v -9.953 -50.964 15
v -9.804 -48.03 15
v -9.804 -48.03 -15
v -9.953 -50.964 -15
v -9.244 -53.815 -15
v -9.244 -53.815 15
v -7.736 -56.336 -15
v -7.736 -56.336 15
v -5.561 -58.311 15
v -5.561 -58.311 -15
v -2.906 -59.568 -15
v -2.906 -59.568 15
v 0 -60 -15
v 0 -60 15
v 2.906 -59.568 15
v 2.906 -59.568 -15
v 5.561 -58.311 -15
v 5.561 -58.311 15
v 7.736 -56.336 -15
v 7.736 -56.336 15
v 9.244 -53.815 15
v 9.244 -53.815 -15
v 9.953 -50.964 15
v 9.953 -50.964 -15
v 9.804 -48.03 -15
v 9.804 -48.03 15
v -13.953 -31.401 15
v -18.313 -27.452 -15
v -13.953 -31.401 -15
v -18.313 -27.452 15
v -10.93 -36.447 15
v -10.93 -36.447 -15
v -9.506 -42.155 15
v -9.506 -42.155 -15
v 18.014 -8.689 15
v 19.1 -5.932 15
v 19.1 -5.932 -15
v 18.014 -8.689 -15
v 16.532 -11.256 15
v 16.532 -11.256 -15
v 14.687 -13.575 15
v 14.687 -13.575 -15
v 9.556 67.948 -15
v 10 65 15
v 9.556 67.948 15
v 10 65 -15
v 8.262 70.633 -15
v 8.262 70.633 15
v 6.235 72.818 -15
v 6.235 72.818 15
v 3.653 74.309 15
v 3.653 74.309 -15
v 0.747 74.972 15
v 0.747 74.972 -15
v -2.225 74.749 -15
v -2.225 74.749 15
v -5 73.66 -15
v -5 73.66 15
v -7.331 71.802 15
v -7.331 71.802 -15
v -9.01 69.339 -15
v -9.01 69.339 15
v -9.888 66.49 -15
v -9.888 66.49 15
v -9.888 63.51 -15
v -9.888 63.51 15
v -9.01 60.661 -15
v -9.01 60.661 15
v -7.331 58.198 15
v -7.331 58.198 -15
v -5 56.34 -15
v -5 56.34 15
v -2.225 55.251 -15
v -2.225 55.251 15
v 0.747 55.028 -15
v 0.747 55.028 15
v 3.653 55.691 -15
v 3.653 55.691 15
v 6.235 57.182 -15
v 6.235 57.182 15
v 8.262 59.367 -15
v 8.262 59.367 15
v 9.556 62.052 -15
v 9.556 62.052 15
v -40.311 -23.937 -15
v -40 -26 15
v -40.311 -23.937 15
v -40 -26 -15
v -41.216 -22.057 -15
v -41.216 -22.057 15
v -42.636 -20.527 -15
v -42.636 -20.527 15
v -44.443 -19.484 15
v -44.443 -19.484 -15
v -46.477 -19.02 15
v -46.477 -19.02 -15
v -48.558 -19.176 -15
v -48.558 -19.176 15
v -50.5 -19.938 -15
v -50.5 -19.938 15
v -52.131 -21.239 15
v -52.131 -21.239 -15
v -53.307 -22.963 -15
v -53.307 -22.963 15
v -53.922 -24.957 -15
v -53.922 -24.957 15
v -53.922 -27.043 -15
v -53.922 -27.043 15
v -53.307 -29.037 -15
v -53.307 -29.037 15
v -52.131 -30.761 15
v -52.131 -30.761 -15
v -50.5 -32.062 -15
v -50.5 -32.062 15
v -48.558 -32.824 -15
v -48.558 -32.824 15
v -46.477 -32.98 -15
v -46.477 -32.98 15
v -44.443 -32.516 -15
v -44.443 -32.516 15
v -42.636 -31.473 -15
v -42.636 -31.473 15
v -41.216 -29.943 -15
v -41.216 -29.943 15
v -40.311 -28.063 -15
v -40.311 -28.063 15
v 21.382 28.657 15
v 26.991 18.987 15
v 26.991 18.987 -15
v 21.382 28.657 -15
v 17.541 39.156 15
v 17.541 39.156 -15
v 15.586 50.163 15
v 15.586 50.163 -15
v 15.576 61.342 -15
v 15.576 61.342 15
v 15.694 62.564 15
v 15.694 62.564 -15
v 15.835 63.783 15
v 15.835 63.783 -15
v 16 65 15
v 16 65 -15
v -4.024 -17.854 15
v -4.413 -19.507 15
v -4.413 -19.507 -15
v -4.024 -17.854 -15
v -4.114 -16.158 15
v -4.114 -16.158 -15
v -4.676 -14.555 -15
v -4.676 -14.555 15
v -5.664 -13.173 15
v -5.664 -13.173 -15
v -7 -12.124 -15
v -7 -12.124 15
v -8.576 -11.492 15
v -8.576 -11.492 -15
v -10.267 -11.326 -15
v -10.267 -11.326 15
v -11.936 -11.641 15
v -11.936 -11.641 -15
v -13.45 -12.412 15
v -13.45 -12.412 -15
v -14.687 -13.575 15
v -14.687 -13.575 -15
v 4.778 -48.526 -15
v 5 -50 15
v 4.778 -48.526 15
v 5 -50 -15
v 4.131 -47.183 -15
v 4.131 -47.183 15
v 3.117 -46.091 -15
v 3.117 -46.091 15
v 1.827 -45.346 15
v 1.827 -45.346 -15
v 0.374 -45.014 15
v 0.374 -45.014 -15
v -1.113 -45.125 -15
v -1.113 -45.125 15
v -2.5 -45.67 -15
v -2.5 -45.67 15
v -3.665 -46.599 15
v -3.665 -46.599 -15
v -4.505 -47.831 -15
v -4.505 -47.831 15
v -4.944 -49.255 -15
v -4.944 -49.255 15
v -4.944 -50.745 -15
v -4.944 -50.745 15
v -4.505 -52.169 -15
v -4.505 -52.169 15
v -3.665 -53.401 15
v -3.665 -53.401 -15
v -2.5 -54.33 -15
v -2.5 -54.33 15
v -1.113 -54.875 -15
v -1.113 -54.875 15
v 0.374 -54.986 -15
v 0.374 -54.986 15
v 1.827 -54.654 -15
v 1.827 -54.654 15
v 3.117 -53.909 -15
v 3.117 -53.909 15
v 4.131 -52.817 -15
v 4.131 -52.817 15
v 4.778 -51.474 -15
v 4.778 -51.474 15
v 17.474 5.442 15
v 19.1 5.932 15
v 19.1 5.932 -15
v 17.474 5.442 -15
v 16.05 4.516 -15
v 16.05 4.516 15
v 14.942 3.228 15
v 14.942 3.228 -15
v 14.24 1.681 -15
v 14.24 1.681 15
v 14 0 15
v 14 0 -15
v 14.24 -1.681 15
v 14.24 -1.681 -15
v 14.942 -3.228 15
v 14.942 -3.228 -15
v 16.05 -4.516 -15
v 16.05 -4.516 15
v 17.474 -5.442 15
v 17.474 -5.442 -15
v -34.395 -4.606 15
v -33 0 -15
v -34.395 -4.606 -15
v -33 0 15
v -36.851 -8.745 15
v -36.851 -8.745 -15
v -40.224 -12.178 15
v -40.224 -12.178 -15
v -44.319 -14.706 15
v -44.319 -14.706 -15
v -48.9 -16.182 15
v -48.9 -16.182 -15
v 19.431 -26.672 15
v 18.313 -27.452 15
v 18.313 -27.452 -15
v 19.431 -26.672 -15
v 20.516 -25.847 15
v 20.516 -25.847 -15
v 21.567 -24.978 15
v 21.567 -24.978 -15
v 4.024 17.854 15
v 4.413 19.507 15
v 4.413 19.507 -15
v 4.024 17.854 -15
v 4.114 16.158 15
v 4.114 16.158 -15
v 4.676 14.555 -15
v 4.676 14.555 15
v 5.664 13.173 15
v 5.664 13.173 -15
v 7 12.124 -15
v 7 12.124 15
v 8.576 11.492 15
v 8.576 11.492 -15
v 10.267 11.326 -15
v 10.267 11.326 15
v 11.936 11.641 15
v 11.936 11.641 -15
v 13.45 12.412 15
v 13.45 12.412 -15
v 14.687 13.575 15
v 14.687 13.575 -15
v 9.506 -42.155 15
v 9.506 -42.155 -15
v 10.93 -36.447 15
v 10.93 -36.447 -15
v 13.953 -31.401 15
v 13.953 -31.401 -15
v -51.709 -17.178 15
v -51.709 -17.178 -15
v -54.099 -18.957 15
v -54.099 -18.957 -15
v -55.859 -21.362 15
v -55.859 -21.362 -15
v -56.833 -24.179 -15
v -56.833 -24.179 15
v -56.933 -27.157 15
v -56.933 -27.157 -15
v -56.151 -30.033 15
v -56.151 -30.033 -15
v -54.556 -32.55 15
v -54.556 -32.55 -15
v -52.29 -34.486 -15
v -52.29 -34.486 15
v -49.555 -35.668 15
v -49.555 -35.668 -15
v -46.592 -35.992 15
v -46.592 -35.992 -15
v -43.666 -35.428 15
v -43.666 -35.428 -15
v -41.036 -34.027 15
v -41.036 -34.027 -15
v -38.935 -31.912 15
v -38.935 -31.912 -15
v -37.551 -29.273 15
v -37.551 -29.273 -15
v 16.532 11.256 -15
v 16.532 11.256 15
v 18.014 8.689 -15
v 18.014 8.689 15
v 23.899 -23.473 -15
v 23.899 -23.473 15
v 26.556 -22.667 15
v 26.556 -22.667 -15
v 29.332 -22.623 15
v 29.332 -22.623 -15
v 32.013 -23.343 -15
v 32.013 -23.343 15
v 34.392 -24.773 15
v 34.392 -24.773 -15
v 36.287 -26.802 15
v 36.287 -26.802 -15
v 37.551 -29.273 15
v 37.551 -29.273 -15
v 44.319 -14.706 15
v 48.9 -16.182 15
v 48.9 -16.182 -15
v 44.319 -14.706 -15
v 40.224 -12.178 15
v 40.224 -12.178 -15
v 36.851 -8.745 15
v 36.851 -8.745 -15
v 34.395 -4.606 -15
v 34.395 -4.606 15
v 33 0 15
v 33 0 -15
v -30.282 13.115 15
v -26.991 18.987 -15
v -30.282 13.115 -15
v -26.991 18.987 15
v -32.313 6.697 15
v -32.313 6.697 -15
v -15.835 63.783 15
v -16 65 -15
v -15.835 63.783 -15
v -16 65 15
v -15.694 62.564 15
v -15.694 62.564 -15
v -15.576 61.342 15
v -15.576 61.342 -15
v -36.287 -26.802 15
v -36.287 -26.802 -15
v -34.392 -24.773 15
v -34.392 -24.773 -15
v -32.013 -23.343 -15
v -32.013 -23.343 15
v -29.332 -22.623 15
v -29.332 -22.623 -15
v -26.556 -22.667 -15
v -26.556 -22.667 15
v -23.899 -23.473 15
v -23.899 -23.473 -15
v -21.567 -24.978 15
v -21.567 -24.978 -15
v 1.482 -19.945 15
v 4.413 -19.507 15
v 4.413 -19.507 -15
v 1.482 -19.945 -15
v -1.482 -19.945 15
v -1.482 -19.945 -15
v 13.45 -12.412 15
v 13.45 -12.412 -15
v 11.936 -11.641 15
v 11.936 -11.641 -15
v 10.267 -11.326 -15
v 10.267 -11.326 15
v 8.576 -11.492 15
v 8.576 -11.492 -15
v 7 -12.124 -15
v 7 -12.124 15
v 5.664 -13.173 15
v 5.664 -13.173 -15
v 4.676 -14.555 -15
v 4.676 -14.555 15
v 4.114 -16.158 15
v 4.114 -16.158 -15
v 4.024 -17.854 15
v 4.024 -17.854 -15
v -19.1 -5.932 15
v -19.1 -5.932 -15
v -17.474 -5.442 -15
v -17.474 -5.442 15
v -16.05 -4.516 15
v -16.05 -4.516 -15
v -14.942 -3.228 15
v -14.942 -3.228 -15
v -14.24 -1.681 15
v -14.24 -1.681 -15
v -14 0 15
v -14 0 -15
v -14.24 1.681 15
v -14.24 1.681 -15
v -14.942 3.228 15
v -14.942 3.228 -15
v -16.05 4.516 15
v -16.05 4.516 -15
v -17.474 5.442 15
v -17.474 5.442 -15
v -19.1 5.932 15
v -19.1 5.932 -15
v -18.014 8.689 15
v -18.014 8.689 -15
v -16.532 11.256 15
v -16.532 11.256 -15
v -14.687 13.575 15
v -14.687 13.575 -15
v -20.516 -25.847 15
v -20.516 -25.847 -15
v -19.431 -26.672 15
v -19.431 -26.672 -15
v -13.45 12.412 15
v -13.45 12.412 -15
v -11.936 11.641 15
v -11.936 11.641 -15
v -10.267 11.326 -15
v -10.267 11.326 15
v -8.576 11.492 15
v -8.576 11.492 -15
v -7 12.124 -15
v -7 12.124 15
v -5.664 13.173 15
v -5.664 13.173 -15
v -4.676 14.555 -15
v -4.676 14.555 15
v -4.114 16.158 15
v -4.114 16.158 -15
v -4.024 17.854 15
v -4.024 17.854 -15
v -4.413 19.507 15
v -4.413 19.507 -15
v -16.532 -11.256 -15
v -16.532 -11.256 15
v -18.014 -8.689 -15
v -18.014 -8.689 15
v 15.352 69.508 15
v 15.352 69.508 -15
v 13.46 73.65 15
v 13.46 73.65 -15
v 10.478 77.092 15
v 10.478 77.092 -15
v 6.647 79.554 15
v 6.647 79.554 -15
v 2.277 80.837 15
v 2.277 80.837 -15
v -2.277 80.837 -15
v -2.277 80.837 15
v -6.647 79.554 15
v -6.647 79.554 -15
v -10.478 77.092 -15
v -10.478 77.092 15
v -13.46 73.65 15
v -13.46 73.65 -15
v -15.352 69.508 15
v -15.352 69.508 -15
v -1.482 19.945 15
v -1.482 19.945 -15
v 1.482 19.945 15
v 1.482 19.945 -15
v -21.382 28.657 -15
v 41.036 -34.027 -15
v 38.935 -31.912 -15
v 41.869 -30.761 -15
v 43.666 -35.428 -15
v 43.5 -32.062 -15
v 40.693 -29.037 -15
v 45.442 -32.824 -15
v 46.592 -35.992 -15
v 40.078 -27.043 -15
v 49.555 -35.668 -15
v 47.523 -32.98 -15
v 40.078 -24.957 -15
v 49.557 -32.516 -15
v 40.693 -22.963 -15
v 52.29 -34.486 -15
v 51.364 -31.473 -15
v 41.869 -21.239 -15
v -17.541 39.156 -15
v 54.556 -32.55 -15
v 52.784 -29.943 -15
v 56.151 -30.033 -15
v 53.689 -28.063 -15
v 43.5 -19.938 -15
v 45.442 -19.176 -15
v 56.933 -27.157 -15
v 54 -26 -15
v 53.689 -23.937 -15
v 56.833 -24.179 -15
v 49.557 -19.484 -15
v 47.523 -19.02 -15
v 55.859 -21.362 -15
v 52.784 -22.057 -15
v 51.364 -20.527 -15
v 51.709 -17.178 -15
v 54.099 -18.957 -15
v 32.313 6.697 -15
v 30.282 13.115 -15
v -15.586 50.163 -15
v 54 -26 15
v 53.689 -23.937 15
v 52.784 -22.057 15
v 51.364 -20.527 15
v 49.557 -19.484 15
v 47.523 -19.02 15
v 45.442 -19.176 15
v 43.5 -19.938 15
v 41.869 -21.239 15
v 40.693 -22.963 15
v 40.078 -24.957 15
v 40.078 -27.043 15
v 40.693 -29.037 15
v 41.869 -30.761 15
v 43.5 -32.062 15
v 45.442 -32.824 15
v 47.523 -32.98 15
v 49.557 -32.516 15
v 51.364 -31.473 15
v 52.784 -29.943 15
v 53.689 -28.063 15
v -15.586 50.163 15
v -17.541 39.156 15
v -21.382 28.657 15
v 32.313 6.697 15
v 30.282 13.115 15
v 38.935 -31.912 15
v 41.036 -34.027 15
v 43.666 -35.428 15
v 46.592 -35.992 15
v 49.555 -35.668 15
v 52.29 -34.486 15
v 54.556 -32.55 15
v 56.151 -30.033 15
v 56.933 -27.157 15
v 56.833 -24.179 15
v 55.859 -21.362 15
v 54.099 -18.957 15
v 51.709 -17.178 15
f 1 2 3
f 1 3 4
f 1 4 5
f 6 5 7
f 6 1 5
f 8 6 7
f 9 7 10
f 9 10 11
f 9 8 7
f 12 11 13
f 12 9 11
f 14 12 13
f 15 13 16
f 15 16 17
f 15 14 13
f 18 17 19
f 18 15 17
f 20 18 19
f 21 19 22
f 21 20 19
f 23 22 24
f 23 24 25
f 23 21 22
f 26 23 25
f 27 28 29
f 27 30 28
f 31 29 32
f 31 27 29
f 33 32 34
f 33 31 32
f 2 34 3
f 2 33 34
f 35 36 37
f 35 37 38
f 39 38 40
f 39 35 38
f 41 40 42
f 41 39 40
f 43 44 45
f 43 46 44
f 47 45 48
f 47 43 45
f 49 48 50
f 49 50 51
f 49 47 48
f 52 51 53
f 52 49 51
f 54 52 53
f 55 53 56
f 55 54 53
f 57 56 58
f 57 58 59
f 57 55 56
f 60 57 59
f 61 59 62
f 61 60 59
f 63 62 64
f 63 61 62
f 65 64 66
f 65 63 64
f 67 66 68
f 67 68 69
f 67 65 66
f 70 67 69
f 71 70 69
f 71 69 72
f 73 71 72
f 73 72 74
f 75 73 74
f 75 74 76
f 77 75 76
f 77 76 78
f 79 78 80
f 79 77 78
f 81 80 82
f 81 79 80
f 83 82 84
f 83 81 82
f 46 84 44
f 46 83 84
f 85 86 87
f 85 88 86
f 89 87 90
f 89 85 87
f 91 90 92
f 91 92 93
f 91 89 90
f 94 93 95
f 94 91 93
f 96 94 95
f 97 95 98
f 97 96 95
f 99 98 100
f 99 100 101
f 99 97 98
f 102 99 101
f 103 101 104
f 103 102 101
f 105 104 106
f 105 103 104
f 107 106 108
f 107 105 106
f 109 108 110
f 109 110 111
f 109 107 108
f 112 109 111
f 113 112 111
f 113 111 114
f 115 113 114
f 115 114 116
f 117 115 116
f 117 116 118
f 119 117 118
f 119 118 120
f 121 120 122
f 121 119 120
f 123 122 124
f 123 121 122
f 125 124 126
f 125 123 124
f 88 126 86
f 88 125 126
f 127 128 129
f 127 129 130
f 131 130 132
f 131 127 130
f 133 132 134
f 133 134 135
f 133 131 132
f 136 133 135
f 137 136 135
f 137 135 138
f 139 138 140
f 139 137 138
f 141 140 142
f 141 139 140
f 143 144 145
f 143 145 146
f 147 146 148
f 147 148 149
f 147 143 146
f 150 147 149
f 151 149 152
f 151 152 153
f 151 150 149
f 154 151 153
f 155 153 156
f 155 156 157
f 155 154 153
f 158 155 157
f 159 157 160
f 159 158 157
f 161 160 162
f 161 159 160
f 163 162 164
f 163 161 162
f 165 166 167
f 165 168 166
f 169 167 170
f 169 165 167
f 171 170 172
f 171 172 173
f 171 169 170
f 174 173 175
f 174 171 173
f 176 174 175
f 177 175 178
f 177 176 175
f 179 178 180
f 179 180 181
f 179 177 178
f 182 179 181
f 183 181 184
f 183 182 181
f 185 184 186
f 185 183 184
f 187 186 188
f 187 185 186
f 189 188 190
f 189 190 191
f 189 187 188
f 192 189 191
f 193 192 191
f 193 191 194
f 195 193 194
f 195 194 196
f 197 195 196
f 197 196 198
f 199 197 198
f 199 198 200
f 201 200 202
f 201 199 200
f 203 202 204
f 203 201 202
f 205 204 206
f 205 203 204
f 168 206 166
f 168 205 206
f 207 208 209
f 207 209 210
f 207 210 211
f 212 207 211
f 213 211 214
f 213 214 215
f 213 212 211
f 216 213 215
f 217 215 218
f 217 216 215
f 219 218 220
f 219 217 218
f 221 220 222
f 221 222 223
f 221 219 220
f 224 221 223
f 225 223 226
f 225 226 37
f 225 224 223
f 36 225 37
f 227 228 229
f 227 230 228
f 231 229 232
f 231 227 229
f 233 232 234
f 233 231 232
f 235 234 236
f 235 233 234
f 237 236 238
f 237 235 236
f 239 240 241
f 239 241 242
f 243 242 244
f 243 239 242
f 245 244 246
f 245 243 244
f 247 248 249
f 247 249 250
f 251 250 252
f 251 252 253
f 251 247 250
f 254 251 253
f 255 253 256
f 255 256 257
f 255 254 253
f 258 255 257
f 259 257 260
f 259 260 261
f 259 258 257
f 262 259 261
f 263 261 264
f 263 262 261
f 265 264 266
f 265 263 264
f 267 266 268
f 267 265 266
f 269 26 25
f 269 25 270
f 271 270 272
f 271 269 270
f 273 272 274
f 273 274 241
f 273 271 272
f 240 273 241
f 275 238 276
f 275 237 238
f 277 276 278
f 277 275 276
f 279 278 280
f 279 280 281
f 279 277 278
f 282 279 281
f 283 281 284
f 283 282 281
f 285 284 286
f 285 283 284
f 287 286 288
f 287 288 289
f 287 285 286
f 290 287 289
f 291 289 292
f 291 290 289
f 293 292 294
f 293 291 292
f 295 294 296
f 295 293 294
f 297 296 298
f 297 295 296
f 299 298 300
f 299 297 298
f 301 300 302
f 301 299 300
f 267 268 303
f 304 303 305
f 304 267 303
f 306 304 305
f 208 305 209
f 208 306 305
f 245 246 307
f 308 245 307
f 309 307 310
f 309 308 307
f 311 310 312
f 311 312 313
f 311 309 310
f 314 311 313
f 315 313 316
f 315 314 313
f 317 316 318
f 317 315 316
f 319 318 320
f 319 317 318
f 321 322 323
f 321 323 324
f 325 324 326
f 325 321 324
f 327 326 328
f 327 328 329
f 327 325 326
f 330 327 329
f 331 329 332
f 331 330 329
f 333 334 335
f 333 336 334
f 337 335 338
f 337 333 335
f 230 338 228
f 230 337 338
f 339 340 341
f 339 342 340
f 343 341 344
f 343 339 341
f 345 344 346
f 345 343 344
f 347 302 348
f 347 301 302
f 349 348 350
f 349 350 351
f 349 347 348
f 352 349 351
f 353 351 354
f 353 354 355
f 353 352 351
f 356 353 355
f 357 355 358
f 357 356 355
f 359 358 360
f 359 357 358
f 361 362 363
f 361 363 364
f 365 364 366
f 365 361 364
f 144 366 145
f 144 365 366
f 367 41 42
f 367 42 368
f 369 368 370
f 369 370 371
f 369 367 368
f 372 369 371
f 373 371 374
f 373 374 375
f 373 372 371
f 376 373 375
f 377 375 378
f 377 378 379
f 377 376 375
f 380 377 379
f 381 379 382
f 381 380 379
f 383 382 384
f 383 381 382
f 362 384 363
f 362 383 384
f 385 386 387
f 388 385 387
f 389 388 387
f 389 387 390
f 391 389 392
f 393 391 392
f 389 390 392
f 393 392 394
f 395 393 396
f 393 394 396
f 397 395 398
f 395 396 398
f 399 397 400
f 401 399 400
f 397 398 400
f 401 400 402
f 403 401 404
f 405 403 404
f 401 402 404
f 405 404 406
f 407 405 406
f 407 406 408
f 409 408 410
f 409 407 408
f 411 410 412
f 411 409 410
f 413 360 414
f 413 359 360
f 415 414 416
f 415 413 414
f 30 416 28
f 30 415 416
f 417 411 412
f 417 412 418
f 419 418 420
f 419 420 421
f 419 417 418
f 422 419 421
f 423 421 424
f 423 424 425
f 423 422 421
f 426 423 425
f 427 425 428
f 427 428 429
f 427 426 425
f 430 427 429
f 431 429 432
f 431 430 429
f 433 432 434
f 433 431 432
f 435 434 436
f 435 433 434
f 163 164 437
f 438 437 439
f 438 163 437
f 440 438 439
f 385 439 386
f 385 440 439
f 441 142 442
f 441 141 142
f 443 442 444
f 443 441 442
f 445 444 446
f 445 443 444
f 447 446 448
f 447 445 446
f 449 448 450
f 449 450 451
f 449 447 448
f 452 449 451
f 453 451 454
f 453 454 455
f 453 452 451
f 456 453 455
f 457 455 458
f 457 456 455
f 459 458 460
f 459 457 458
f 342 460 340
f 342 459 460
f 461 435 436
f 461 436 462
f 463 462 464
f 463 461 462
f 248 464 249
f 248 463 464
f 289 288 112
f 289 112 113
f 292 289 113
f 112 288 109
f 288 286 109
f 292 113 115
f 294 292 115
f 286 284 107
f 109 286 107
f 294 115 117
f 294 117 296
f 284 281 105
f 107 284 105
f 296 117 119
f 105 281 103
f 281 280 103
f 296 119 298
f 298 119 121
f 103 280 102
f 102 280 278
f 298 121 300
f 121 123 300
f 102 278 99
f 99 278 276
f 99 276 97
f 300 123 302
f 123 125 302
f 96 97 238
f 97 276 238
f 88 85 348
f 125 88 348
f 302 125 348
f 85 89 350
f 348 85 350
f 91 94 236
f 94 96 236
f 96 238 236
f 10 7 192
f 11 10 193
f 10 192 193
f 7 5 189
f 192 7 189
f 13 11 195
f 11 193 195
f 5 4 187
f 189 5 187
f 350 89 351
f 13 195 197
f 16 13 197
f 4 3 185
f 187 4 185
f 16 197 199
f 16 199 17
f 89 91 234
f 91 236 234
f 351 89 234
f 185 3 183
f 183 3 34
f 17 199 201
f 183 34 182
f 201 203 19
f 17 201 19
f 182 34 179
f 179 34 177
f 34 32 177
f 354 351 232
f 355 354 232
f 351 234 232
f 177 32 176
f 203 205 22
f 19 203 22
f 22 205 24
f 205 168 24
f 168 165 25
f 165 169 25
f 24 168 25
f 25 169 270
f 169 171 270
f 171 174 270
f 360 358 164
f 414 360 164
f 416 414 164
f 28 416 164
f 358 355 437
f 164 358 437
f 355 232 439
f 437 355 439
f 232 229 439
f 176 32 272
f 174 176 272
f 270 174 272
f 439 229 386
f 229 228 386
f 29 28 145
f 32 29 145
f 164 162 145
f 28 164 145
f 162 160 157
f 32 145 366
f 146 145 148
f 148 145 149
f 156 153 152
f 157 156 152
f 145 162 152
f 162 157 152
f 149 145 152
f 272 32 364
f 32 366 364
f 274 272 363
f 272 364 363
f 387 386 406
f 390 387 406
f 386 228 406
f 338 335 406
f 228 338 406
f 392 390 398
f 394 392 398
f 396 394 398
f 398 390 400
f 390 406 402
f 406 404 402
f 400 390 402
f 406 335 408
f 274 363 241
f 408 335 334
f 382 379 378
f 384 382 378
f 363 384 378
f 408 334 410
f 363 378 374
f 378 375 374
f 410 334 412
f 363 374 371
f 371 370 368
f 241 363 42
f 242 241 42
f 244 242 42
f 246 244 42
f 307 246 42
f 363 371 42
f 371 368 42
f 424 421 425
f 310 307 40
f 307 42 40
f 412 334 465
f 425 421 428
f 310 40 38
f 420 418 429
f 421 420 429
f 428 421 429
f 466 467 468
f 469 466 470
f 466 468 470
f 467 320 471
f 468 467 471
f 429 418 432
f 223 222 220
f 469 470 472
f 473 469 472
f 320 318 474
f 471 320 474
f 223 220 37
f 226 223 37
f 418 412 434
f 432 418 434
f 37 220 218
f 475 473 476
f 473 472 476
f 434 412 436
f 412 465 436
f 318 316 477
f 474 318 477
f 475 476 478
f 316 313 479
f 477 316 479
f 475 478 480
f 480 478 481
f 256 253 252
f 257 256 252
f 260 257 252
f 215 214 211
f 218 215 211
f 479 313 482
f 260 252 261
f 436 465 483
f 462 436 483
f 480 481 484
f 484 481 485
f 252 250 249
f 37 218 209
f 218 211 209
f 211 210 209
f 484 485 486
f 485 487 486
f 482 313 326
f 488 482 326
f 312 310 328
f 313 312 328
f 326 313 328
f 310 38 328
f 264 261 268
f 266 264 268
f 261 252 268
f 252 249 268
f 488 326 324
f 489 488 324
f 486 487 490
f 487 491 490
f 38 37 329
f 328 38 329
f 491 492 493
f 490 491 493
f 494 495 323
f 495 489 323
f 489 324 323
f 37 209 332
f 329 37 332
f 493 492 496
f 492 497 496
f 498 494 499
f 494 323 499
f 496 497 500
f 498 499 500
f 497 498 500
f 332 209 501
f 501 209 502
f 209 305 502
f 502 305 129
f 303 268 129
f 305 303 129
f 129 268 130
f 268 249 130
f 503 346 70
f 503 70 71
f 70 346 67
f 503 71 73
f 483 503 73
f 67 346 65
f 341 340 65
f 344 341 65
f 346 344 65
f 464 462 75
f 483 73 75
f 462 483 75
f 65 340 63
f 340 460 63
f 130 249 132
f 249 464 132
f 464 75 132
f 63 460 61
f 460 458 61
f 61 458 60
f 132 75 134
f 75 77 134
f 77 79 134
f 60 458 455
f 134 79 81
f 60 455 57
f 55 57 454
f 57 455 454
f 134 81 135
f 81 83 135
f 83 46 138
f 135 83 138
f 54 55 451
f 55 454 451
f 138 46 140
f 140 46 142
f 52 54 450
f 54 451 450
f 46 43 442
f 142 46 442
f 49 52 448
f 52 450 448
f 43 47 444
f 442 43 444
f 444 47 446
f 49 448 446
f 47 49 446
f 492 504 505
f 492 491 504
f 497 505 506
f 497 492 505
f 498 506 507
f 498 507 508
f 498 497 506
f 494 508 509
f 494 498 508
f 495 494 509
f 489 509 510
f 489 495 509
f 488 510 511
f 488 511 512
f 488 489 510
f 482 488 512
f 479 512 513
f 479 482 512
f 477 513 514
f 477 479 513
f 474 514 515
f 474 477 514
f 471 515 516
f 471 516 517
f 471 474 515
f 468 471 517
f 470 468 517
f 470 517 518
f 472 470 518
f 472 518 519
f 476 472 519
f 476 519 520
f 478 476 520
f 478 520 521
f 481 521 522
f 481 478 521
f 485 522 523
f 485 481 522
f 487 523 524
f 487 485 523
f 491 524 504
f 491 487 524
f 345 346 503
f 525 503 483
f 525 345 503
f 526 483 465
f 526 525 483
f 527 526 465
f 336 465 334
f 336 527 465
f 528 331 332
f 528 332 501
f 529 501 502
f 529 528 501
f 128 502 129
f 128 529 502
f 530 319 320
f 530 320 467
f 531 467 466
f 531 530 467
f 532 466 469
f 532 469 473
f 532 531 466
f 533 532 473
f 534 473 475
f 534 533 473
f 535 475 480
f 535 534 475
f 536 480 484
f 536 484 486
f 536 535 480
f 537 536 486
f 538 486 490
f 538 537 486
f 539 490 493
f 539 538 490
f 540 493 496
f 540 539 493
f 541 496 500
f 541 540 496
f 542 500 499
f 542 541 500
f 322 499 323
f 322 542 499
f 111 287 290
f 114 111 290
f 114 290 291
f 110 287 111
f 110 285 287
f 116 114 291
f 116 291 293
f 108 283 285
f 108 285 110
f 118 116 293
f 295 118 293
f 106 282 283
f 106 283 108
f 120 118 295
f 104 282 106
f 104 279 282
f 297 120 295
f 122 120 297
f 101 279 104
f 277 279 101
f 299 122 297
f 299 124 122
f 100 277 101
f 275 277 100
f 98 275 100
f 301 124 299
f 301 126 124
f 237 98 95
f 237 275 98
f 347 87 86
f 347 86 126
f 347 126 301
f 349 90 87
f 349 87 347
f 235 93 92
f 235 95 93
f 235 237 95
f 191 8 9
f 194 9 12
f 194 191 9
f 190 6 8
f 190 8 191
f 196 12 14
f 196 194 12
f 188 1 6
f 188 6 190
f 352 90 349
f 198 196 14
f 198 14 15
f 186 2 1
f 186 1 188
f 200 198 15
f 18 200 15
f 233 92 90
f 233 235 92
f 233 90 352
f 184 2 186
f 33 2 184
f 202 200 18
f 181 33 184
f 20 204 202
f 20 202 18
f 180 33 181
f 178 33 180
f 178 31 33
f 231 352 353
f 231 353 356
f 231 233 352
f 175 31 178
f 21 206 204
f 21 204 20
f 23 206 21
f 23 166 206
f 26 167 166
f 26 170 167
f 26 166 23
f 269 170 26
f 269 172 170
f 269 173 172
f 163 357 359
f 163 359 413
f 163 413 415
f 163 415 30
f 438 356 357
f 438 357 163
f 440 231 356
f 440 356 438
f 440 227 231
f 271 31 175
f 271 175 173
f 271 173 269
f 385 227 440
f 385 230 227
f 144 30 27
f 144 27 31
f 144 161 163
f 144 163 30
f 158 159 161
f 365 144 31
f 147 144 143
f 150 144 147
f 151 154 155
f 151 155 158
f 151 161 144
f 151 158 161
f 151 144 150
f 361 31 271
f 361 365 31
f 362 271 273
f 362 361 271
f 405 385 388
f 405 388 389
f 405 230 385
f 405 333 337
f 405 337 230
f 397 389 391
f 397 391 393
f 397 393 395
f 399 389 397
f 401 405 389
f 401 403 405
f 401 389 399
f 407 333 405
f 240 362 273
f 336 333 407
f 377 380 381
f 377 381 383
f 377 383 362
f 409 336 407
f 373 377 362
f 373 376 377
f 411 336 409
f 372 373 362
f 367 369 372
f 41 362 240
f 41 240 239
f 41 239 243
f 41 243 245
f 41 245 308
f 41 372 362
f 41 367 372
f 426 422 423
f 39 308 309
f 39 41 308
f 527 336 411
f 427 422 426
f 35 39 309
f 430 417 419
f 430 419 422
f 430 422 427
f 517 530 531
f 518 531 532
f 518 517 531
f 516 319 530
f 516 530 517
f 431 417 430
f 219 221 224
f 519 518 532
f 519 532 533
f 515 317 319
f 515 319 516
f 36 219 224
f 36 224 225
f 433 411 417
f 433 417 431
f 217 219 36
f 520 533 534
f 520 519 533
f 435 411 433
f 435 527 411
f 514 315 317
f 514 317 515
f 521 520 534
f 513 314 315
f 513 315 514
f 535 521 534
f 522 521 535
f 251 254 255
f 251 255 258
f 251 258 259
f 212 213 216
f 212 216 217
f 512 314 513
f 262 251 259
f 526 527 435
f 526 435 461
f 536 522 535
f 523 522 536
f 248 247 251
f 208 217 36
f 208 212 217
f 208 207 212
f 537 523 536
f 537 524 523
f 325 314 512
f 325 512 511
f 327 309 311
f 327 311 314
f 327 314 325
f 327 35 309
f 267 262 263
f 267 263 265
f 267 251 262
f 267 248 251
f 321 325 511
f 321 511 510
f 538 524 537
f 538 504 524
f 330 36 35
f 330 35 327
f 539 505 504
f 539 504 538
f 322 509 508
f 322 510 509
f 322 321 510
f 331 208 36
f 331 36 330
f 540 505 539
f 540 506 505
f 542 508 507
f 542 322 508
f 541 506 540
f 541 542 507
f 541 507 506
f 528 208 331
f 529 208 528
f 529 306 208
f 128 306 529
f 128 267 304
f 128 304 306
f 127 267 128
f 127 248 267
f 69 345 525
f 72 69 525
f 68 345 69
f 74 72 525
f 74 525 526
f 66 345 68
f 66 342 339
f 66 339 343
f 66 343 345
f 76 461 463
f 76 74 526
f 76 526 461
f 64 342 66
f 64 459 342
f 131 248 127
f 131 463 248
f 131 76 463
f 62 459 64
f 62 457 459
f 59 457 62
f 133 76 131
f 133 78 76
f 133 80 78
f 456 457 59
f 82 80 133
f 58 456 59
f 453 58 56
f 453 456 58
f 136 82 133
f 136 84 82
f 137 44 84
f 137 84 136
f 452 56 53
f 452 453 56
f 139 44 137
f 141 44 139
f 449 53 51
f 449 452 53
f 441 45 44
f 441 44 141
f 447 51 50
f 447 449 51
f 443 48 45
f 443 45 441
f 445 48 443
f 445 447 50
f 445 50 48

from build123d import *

# Parameters (mm, degrees)
SKETCH1_R           = 7
SKETCH1_R_2         = 5
SKETCH1_R_3         = 10
BOSS_EXTRUDE1_DEPTH = 15


with BuildPart() as part:
    # Sketch1 → Boss-Extrude1 (new, symmetric)
    with BuildSketch(Plane.XY):
        with BuildLine():
            ThreePointArc((-18.313197236, -27.452264151), (-10.929939867, -36.447383635), (-9.804034884, -48.03))
            ThreePointArc((-9.804034884, -48.03), (0, -60), (9.804034884, -48.03))
            ThreePointArc((9.804034884, -48.03), (10.929939867, -36.447383635), (18.313197236, -27.452264151))
            ThreePointArc((18.313197236, -27.452264151), (19.978209416, -26.265398313), (21.566520754, -24.9776937))
            ThreePointArc((21.566520754, -24.9776937), (30.697148757, -22.889346352), (37.550915036, -29.273345896))
            ThreePointArc((37.550915036, -29.273345896), (54.555971575, -32.550365911), (48.899852708, -16.182130593))
            ThreePointArc((48.899852708, -16.182130593), (38.43354311, -10.563553249), (33, 0))
            ThreePointArc((33, 0), (31.461859707, 9.957478785), (26.990825227, 18.986715186))
            ThreePointArc((26.990825227, 18.986715186), (17.541357446, 39.155919937), (15.576262231, 61.342124263))
            ThreePointArc((15.576262231, 61.342124263), (15.761817989, 63.174110312), (16, 65))
            ThreePointArc((16, 65), (0, 81), (-16, 65))
            ThreePointArc((-16, 65), (-15.761817989, 63.174110312), (-15.576262231, 61.342124263))
            ThreePointArc((-15.576262231, 61.342124263), (-17.541357446, 39.155919937), (-26.990825227, 18.986715186))
            ThreePointArc((-26.990825227, 18.986715186), (-31.461859707, 9.957478785), (-33, 0))
            ThreePointArc((-33, 0), (-38.43354311, -10.563553249), (-48.899852708, -16.182130593))
            ThreePointArc((-48.899852708, -16.182130593), (-54.555971575, -32.550365911), (-37.550915036, -29.273345896))
            ThreePointArc((-37.550915036, -29.273345896), (-30.697148757, -22.889346352), (-21.566520754, -24.9776937))
            ThreePointArc((-21.566520754, -24.9776937), (-19.978209416, -26.265398313), (-18.313197236, -27.452264151))
        make_face()
        with Locations((-47, -26)):
            Circle(SKETCH1_R, mode=Mode.SUBTRACT)
        with Locations((0, -50)):
            Circle(SKETCH1_R_2, mode=Mode.SUBTRACT)
        with BuildLine():
            ThreePointArc((19.1, -5.93211598), (17.320508076, -10), (14.687363137, -13.575027222))
            ThreePointArc((14.687363137, -13.575027222), (7, -12.124355653), (4.412636863, -19.507143202))
            ThreePointArc((4.412636863, -19.507143202), (0, -20), (-4.412636863, -19.507143202))
            ThreePointArc((-4.412636863, -19.507143202), (-7, -12.124355653), (-14.687363137, -13.575027222))
            ThreePointArc((-14.687363137, -13.575027222), (-17.320508076, -10), (-19.1, -5.93211598))
            ThreePointArc((-19.1, -5.93211598), (-14, 0), (-19.1, 5.93211598))
            ThreePointArc((-19.1, 5.93211598), (-17.320508076, 10), (-14.687363137, 13.575027222))
            ThreePointArc((-14.687363137, 13.575027222), (-7, 12.124355653), (-4.412636863, 19.507143202))
            ThreePointArc((-4.412636863, 19.507143202), (0, 20), (4.412636863, 19.507143202))
            ThreePointArc((4.412636863, 19.507143202), (7, 12.124355653), (14.687363137, 13.575027222))
            ThreePointArc((14.687363137, 13.575027222), (17.320508076, 10), (19.1, 5.93211598))
            ThreePointArc((19.1, 5.93211598), (14, 0), (19.1, -5.93211598))
        make_face(mode=Mode.SUBTRACT)
        with Locations((47, -26)):
            Circle(SKETCH1_R, mode=Mode.SUBTRACT)
        with Locations((0, 65)):
            Circle(SKETCH1_R_3, mode=Mode.SUBTRACT)
    extrude(amount=BOSS_EXTRUDE1_DEPTH, both=True)


solid = part.part
